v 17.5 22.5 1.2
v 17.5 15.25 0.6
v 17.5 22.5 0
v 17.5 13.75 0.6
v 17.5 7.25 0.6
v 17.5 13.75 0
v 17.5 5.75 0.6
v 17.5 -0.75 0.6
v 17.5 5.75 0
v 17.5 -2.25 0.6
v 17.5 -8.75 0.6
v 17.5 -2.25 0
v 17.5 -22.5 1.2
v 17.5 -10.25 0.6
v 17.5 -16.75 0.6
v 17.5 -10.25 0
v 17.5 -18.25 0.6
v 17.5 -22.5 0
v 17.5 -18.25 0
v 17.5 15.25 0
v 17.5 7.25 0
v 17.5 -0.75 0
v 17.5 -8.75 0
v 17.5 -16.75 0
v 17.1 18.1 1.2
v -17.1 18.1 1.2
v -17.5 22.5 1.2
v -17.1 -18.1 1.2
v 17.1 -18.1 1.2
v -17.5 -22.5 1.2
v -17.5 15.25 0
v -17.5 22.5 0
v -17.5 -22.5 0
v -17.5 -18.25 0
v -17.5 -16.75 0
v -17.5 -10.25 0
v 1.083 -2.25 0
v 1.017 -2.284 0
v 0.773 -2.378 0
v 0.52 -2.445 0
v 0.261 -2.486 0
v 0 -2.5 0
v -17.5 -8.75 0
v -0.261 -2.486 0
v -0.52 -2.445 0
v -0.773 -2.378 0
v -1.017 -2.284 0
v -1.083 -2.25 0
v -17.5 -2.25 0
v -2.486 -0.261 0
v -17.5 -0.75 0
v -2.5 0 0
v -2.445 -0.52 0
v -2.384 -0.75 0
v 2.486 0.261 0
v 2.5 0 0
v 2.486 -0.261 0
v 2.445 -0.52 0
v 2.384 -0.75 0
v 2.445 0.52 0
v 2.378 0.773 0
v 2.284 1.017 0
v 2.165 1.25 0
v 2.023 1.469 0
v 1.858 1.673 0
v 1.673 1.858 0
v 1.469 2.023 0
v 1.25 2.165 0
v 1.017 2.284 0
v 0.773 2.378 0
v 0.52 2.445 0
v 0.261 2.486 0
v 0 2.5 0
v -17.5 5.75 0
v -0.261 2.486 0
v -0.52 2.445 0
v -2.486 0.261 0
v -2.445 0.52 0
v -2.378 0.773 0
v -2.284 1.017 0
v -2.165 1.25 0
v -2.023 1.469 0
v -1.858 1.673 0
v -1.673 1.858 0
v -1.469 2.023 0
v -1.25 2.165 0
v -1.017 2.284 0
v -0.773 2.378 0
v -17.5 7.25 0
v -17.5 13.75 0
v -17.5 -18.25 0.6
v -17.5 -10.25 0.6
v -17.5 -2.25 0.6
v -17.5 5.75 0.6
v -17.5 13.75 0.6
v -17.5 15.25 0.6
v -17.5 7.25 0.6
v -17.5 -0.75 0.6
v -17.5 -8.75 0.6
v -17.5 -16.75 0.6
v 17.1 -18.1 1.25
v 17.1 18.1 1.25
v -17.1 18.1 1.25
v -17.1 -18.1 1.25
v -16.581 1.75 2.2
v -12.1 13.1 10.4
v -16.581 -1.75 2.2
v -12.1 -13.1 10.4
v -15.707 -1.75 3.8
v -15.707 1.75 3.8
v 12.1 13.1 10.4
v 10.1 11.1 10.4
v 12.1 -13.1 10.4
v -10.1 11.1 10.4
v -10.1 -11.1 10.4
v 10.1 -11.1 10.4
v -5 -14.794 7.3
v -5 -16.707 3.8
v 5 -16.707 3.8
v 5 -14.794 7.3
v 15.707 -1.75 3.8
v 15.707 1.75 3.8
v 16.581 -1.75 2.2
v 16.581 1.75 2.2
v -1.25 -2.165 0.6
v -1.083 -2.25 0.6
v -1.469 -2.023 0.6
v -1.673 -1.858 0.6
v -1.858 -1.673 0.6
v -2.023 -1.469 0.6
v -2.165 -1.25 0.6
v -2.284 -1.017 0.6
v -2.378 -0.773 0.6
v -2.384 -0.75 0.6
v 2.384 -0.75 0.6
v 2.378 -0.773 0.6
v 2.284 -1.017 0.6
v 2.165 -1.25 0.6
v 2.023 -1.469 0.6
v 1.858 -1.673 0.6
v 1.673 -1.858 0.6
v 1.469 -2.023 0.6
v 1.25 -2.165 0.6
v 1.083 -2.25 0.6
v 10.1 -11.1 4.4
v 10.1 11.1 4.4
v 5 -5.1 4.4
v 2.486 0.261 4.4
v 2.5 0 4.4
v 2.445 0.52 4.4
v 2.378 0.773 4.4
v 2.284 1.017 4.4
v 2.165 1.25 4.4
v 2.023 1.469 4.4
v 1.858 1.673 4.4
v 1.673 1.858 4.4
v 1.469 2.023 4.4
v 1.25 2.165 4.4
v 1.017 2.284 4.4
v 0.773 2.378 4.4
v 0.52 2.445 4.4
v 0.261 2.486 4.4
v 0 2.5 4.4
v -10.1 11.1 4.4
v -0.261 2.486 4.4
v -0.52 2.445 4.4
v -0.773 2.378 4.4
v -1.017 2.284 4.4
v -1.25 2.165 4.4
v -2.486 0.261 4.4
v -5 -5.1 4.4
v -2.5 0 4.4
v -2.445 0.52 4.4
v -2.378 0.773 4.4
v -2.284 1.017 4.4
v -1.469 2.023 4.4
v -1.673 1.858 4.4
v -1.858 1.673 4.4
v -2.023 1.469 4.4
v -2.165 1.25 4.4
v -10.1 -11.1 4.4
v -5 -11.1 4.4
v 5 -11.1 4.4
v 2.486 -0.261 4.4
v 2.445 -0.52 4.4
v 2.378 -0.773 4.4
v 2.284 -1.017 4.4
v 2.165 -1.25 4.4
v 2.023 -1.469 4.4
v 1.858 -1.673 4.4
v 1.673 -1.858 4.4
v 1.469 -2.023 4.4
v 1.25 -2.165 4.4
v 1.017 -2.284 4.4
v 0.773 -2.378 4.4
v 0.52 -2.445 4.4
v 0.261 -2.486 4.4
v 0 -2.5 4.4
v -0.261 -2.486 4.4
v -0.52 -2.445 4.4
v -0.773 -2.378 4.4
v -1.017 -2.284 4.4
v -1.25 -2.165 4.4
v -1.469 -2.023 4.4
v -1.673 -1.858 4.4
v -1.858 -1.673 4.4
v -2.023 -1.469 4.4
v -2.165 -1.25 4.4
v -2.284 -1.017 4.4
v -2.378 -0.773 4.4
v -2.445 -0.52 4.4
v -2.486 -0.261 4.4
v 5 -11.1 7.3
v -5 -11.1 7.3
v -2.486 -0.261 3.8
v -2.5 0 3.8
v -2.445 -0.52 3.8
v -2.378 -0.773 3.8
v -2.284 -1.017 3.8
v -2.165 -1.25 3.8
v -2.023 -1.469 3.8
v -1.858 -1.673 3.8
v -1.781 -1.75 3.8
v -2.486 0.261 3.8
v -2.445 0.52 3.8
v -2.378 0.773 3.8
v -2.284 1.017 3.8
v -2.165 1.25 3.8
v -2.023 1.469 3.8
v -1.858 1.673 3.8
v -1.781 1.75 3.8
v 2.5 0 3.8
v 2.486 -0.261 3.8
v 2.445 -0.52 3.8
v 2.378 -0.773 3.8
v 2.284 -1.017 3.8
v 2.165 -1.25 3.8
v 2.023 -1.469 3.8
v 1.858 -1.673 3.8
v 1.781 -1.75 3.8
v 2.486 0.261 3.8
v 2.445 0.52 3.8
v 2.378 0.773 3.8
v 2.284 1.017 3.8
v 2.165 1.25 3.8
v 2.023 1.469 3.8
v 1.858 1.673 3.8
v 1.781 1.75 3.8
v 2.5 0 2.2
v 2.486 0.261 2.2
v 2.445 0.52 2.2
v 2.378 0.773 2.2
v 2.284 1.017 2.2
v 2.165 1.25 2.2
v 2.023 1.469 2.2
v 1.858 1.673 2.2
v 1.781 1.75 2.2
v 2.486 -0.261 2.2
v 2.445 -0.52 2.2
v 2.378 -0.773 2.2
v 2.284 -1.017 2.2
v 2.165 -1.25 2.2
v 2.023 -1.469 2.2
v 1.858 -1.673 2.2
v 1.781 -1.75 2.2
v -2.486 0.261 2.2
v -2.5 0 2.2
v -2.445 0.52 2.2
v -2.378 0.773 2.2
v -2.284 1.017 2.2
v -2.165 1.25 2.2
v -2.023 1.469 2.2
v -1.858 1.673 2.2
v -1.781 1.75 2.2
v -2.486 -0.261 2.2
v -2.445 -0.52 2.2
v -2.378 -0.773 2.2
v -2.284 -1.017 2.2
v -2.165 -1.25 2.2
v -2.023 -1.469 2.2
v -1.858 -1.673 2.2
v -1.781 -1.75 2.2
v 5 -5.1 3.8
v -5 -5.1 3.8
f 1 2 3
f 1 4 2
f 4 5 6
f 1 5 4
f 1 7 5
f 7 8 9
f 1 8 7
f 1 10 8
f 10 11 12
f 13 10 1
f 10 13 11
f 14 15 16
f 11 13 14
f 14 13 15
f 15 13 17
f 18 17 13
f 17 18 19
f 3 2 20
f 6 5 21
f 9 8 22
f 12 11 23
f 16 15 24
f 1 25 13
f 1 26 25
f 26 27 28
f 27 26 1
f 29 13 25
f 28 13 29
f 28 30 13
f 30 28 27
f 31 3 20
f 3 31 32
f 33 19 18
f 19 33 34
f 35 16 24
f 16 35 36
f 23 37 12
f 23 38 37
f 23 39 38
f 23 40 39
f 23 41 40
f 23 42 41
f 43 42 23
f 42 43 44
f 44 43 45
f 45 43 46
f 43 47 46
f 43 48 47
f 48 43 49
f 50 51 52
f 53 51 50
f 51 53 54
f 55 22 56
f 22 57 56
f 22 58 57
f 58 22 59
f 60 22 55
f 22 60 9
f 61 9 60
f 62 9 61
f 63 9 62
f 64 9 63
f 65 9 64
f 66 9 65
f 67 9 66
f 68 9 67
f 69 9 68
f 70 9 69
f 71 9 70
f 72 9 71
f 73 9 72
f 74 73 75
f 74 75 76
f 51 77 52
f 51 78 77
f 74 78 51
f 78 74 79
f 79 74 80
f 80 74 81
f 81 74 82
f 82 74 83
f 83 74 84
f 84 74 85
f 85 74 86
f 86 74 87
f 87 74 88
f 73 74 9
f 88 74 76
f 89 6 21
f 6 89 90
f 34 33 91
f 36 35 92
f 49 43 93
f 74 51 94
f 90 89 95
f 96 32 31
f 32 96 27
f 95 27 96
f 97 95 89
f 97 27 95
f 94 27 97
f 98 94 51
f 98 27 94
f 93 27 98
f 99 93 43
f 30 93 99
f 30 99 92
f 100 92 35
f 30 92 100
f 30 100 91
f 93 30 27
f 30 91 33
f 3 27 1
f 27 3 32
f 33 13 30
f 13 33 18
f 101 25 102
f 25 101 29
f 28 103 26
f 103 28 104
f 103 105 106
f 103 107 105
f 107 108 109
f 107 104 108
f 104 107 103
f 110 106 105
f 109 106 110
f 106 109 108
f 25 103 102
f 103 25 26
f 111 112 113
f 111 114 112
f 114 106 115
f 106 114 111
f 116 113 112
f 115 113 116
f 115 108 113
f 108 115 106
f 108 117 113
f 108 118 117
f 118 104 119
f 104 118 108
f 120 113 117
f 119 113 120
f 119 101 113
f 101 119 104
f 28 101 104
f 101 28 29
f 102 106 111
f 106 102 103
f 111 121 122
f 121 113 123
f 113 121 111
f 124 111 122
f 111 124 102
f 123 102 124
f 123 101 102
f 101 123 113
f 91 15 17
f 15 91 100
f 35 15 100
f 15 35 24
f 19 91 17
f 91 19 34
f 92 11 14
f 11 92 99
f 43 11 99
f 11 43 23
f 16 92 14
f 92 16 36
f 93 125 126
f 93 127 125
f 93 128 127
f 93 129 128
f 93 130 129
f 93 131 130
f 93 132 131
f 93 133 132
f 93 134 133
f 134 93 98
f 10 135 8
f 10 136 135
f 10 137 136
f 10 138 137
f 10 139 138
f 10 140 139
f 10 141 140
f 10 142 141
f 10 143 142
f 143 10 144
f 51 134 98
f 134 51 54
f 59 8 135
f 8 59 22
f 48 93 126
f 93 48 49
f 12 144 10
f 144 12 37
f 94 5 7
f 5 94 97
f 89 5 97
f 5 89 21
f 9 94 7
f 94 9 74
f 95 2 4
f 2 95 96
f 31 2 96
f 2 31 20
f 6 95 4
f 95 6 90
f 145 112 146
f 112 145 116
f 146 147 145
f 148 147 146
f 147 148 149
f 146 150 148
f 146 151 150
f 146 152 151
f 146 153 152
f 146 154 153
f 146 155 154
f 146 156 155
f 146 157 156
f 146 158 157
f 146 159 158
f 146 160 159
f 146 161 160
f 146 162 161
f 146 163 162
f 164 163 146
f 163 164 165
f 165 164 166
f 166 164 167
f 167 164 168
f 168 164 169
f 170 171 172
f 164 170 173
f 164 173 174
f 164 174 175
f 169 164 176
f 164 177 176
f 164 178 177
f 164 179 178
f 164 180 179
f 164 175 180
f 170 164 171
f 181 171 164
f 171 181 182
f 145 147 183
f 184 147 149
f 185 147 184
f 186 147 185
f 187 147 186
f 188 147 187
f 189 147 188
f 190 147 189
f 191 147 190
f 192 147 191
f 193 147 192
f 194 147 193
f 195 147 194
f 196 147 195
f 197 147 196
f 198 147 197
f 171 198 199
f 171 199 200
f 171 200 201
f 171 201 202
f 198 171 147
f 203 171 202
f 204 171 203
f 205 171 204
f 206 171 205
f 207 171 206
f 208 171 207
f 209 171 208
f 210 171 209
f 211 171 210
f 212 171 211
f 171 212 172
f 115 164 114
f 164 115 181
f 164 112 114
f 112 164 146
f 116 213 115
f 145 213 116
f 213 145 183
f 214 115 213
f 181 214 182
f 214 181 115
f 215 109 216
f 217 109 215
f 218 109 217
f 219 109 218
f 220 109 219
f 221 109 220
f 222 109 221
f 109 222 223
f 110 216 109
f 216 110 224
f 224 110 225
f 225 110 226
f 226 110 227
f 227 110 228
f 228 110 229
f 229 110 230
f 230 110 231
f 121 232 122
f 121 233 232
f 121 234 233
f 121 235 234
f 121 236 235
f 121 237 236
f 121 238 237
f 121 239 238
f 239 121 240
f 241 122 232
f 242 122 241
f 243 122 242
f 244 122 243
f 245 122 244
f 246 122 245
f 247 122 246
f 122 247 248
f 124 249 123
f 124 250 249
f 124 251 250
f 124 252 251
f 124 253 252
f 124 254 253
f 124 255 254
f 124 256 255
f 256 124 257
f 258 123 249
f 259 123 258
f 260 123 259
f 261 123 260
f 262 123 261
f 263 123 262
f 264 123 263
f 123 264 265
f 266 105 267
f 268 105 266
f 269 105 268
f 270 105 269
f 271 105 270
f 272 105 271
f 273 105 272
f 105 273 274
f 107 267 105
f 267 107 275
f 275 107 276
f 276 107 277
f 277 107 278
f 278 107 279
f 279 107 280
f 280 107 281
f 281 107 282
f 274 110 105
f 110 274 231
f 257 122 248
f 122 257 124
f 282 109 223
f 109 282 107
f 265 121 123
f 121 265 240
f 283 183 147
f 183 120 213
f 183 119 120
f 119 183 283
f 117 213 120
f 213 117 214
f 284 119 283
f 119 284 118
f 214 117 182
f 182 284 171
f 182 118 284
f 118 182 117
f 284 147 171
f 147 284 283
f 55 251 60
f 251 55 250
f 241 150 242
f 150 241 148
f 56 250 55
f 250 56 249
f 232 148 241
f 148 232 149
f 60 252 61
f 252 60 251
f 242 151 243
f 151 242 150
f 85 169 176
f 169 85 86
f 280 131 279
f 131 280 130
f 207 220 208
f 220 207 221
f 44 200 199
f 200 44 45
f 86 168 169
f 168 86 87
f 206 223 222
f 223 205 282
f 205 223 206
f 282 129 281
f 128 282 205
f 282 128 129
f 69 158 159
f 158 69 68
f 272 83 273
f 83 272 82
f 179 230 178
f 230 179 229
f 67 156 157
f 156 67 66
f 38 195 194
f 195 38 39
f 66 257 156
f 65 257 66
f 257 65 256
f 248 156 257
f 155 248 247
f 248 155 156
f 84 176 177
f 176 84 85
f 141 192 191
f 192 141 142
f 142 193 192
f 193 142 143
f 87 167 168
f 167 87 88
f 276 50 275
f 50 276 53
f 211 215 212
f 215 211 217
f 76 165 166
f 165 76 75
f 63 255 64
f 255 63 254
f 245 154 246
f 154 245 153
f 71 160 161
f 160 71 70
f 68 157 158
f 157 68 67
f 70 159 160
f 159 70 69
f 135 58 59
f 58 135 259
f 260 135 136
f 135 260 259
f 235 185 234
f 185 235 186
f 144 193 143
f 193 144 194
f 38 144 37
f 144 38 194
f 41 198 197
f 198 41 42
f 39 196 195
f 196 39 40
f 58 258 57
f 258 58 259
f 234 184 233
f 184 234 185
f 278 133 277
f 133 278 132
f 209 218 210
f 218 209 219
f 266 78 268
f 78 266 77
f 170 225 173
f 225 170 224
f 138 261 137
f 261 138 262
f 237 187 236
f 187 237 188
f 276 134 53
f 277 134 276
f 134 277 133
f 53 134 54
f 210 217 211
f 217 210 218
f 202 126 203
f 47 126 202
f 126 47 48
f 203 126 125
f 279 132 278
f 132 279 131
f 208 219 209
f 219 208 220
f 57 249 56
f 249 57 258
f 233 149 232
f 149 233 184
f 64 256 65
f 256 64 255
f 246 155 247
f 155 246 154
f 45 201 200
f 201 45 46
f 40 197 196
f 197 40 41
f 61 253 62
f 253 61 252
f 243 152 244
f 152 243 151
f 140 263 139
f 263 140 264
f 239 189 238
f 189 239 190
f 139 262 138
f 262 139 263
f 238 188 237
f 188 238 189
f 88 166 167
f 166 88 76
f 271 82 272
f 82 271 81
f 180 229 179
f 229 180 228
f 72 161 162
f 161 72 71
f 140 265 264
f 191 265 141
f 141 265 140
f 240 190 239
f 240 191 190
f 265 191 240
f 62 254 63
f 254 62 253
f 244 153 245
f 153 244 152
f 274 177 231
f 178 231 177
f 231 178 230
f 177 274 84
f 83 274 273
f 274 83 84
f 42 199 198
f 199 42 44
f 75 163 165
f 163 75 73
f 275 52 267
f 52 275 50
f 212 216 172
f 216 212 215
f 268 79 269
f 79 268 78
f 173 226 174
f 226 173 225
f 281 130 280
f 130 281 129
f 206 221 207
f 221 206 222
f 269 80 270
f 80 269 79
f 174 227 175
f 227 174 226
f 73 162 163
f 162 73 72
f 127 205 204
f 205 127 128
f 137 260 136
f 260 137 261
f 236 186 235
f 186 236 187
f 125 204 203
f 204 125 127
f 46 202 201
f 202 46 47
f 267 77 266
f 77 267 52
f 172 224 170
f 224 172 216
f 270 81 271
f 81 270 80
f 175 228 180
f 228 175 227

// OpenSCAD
// =============================================================================
// PROJECT: FLEXIBLE FIXED-WING GPS MOUNT
// VERSION: 1.1 (Educational / Conformal Base)
// DESCRIPTION: A glue-on mount featuring a "lattice" base to wrap around 
//              fuselages and a "faired" profile to reduce drag.
// =============================================================================

/* [1. BASE PLATE SETTINGS] */

// The width of the glue footprint.
base_w          = 35.0;  

// The length of the glue footprint.
base_l          = 45.0;  

// 1.2mm is the "Sweet Spot" for flexibility—thick enough to hold, thin enough to bend.
base_thick      = 1.2;   

// The width of the relief cuts that allow the TPU to curve.
slot_width      = 1.5;   

/* [2. GPS COMPARTMENT SETTINGS] */

// 0 = Flat. If your wing is angled, you can tilt the box to keep the GPS level.
gps_angle       = 0;     

gps_w           = 20.2;  
gps_l           = 22.2;  
gps_d           = 6.0;   
wall_thickness  = 2.0;   

/* [3. HARDWARE & RETENTION] */

ziptie_width    = 3.5;   
ziptie_thick    = 1.6; 

// The portal where the wires enter the box from the back.
wire_window_w   = 10.0;
wire_window_h   = 3.5;

// The diameter of the hole in the bottom (useful for poking the GPS out).
wire_hole_dia   = 5.0;   

/* [4. INTERNAL CALCULATIONS] */

$fn = 60;
box_w = gps_w + (wall_thickness * 2);
box_l = gps_l + (wall_thickness * 2);
box_d = gps_d + 1.2; // 1.2mm floor thickness

// =============================================================================
// MAIN ASSEMBLY
// =============================================================================

difference() {
    
    // --- STEP 1: THE SOLID BODY ---
    union() {
        
        // A. The Flexible Base Plate
        // This is the "sticker" that gets glued to the foam.
        translate([0, 0, base_thick/2])
            cube([base_w, base_l, base_thick], center=true);
        
        // B. The Aerodynamic Fairing
        // We use 'hull' to blend the base into the GPS box.
        // This prevents sharp edges that cause air turbulence (drag).
        hull() {
            // Anchor 1: A thin slice sitting on the base.
            translate([0, 0, base_thick])
                cube([box_w + 10, box_l + 10, 0.1], center=true);
            
            // Anchor 2: The actual GPS housing box.
            translate([0, 0, box_d/2 + base_thick + 2])
                rotate([-gps_angle, 0, 0])
                    cube([box_w, box_l, box_d], center=true);
        }
    }

    // --- STEP 2: THE SUBTRACTIONS (The "Milling" Phase) ---

    // A. FLEX RELIEF SLOTS
    // We use a 'for' loop to repeat the cuts every 8mm.
    // This turns a stiff plate into a flexible "tank tread" design.
    for(i = [-base_l/2 + 5 : 8 : base_l/2 - 5]) {
        translate([0, i, -1])
            cube([base_w + 2, slot_width, base_thick + 2], center=true);
    }

    // B. Internal Cavity Group (Everything here is relative to the GPS box)
    translate([0, 0, box_d/2 + base_thick + 2])
        rotate([-gps_angle, 0, 0]) {
                
            // 1. The main cavity for the GPS module.
            translate([0, 0, (box_d/2 - gps_d/2) + 0.1])
                cube([gps_w, gps_l, gps_d + 0.2], center=true);
            
            // 2. The Zip-Tie Trench.
            // This allows the zip-tie to go UNDER the GPS so it stays flush.
            translate([0, 0, -gps_d/2 - (ziptie_thick/2)])
                cube([box_w + 50, ziptie_width, ziptie_thick], center=true);

            // 3. The Rear Wire Window.
            // Where the wires enter the back of the box.
            translate([0, -gps_l/2, -gps_d/2 + (wire_window_h/2)])
                cube([wire_window_w, wall_thickness * 6, wire_window_h], center=true);
            
            // 4. The Center Push-out Port.
            // A long vertical drill that goes through the floor and the base.
            translate([0, 0, -50])
                cylinder(h=100, d=wire_hole_dia);
        }
}
